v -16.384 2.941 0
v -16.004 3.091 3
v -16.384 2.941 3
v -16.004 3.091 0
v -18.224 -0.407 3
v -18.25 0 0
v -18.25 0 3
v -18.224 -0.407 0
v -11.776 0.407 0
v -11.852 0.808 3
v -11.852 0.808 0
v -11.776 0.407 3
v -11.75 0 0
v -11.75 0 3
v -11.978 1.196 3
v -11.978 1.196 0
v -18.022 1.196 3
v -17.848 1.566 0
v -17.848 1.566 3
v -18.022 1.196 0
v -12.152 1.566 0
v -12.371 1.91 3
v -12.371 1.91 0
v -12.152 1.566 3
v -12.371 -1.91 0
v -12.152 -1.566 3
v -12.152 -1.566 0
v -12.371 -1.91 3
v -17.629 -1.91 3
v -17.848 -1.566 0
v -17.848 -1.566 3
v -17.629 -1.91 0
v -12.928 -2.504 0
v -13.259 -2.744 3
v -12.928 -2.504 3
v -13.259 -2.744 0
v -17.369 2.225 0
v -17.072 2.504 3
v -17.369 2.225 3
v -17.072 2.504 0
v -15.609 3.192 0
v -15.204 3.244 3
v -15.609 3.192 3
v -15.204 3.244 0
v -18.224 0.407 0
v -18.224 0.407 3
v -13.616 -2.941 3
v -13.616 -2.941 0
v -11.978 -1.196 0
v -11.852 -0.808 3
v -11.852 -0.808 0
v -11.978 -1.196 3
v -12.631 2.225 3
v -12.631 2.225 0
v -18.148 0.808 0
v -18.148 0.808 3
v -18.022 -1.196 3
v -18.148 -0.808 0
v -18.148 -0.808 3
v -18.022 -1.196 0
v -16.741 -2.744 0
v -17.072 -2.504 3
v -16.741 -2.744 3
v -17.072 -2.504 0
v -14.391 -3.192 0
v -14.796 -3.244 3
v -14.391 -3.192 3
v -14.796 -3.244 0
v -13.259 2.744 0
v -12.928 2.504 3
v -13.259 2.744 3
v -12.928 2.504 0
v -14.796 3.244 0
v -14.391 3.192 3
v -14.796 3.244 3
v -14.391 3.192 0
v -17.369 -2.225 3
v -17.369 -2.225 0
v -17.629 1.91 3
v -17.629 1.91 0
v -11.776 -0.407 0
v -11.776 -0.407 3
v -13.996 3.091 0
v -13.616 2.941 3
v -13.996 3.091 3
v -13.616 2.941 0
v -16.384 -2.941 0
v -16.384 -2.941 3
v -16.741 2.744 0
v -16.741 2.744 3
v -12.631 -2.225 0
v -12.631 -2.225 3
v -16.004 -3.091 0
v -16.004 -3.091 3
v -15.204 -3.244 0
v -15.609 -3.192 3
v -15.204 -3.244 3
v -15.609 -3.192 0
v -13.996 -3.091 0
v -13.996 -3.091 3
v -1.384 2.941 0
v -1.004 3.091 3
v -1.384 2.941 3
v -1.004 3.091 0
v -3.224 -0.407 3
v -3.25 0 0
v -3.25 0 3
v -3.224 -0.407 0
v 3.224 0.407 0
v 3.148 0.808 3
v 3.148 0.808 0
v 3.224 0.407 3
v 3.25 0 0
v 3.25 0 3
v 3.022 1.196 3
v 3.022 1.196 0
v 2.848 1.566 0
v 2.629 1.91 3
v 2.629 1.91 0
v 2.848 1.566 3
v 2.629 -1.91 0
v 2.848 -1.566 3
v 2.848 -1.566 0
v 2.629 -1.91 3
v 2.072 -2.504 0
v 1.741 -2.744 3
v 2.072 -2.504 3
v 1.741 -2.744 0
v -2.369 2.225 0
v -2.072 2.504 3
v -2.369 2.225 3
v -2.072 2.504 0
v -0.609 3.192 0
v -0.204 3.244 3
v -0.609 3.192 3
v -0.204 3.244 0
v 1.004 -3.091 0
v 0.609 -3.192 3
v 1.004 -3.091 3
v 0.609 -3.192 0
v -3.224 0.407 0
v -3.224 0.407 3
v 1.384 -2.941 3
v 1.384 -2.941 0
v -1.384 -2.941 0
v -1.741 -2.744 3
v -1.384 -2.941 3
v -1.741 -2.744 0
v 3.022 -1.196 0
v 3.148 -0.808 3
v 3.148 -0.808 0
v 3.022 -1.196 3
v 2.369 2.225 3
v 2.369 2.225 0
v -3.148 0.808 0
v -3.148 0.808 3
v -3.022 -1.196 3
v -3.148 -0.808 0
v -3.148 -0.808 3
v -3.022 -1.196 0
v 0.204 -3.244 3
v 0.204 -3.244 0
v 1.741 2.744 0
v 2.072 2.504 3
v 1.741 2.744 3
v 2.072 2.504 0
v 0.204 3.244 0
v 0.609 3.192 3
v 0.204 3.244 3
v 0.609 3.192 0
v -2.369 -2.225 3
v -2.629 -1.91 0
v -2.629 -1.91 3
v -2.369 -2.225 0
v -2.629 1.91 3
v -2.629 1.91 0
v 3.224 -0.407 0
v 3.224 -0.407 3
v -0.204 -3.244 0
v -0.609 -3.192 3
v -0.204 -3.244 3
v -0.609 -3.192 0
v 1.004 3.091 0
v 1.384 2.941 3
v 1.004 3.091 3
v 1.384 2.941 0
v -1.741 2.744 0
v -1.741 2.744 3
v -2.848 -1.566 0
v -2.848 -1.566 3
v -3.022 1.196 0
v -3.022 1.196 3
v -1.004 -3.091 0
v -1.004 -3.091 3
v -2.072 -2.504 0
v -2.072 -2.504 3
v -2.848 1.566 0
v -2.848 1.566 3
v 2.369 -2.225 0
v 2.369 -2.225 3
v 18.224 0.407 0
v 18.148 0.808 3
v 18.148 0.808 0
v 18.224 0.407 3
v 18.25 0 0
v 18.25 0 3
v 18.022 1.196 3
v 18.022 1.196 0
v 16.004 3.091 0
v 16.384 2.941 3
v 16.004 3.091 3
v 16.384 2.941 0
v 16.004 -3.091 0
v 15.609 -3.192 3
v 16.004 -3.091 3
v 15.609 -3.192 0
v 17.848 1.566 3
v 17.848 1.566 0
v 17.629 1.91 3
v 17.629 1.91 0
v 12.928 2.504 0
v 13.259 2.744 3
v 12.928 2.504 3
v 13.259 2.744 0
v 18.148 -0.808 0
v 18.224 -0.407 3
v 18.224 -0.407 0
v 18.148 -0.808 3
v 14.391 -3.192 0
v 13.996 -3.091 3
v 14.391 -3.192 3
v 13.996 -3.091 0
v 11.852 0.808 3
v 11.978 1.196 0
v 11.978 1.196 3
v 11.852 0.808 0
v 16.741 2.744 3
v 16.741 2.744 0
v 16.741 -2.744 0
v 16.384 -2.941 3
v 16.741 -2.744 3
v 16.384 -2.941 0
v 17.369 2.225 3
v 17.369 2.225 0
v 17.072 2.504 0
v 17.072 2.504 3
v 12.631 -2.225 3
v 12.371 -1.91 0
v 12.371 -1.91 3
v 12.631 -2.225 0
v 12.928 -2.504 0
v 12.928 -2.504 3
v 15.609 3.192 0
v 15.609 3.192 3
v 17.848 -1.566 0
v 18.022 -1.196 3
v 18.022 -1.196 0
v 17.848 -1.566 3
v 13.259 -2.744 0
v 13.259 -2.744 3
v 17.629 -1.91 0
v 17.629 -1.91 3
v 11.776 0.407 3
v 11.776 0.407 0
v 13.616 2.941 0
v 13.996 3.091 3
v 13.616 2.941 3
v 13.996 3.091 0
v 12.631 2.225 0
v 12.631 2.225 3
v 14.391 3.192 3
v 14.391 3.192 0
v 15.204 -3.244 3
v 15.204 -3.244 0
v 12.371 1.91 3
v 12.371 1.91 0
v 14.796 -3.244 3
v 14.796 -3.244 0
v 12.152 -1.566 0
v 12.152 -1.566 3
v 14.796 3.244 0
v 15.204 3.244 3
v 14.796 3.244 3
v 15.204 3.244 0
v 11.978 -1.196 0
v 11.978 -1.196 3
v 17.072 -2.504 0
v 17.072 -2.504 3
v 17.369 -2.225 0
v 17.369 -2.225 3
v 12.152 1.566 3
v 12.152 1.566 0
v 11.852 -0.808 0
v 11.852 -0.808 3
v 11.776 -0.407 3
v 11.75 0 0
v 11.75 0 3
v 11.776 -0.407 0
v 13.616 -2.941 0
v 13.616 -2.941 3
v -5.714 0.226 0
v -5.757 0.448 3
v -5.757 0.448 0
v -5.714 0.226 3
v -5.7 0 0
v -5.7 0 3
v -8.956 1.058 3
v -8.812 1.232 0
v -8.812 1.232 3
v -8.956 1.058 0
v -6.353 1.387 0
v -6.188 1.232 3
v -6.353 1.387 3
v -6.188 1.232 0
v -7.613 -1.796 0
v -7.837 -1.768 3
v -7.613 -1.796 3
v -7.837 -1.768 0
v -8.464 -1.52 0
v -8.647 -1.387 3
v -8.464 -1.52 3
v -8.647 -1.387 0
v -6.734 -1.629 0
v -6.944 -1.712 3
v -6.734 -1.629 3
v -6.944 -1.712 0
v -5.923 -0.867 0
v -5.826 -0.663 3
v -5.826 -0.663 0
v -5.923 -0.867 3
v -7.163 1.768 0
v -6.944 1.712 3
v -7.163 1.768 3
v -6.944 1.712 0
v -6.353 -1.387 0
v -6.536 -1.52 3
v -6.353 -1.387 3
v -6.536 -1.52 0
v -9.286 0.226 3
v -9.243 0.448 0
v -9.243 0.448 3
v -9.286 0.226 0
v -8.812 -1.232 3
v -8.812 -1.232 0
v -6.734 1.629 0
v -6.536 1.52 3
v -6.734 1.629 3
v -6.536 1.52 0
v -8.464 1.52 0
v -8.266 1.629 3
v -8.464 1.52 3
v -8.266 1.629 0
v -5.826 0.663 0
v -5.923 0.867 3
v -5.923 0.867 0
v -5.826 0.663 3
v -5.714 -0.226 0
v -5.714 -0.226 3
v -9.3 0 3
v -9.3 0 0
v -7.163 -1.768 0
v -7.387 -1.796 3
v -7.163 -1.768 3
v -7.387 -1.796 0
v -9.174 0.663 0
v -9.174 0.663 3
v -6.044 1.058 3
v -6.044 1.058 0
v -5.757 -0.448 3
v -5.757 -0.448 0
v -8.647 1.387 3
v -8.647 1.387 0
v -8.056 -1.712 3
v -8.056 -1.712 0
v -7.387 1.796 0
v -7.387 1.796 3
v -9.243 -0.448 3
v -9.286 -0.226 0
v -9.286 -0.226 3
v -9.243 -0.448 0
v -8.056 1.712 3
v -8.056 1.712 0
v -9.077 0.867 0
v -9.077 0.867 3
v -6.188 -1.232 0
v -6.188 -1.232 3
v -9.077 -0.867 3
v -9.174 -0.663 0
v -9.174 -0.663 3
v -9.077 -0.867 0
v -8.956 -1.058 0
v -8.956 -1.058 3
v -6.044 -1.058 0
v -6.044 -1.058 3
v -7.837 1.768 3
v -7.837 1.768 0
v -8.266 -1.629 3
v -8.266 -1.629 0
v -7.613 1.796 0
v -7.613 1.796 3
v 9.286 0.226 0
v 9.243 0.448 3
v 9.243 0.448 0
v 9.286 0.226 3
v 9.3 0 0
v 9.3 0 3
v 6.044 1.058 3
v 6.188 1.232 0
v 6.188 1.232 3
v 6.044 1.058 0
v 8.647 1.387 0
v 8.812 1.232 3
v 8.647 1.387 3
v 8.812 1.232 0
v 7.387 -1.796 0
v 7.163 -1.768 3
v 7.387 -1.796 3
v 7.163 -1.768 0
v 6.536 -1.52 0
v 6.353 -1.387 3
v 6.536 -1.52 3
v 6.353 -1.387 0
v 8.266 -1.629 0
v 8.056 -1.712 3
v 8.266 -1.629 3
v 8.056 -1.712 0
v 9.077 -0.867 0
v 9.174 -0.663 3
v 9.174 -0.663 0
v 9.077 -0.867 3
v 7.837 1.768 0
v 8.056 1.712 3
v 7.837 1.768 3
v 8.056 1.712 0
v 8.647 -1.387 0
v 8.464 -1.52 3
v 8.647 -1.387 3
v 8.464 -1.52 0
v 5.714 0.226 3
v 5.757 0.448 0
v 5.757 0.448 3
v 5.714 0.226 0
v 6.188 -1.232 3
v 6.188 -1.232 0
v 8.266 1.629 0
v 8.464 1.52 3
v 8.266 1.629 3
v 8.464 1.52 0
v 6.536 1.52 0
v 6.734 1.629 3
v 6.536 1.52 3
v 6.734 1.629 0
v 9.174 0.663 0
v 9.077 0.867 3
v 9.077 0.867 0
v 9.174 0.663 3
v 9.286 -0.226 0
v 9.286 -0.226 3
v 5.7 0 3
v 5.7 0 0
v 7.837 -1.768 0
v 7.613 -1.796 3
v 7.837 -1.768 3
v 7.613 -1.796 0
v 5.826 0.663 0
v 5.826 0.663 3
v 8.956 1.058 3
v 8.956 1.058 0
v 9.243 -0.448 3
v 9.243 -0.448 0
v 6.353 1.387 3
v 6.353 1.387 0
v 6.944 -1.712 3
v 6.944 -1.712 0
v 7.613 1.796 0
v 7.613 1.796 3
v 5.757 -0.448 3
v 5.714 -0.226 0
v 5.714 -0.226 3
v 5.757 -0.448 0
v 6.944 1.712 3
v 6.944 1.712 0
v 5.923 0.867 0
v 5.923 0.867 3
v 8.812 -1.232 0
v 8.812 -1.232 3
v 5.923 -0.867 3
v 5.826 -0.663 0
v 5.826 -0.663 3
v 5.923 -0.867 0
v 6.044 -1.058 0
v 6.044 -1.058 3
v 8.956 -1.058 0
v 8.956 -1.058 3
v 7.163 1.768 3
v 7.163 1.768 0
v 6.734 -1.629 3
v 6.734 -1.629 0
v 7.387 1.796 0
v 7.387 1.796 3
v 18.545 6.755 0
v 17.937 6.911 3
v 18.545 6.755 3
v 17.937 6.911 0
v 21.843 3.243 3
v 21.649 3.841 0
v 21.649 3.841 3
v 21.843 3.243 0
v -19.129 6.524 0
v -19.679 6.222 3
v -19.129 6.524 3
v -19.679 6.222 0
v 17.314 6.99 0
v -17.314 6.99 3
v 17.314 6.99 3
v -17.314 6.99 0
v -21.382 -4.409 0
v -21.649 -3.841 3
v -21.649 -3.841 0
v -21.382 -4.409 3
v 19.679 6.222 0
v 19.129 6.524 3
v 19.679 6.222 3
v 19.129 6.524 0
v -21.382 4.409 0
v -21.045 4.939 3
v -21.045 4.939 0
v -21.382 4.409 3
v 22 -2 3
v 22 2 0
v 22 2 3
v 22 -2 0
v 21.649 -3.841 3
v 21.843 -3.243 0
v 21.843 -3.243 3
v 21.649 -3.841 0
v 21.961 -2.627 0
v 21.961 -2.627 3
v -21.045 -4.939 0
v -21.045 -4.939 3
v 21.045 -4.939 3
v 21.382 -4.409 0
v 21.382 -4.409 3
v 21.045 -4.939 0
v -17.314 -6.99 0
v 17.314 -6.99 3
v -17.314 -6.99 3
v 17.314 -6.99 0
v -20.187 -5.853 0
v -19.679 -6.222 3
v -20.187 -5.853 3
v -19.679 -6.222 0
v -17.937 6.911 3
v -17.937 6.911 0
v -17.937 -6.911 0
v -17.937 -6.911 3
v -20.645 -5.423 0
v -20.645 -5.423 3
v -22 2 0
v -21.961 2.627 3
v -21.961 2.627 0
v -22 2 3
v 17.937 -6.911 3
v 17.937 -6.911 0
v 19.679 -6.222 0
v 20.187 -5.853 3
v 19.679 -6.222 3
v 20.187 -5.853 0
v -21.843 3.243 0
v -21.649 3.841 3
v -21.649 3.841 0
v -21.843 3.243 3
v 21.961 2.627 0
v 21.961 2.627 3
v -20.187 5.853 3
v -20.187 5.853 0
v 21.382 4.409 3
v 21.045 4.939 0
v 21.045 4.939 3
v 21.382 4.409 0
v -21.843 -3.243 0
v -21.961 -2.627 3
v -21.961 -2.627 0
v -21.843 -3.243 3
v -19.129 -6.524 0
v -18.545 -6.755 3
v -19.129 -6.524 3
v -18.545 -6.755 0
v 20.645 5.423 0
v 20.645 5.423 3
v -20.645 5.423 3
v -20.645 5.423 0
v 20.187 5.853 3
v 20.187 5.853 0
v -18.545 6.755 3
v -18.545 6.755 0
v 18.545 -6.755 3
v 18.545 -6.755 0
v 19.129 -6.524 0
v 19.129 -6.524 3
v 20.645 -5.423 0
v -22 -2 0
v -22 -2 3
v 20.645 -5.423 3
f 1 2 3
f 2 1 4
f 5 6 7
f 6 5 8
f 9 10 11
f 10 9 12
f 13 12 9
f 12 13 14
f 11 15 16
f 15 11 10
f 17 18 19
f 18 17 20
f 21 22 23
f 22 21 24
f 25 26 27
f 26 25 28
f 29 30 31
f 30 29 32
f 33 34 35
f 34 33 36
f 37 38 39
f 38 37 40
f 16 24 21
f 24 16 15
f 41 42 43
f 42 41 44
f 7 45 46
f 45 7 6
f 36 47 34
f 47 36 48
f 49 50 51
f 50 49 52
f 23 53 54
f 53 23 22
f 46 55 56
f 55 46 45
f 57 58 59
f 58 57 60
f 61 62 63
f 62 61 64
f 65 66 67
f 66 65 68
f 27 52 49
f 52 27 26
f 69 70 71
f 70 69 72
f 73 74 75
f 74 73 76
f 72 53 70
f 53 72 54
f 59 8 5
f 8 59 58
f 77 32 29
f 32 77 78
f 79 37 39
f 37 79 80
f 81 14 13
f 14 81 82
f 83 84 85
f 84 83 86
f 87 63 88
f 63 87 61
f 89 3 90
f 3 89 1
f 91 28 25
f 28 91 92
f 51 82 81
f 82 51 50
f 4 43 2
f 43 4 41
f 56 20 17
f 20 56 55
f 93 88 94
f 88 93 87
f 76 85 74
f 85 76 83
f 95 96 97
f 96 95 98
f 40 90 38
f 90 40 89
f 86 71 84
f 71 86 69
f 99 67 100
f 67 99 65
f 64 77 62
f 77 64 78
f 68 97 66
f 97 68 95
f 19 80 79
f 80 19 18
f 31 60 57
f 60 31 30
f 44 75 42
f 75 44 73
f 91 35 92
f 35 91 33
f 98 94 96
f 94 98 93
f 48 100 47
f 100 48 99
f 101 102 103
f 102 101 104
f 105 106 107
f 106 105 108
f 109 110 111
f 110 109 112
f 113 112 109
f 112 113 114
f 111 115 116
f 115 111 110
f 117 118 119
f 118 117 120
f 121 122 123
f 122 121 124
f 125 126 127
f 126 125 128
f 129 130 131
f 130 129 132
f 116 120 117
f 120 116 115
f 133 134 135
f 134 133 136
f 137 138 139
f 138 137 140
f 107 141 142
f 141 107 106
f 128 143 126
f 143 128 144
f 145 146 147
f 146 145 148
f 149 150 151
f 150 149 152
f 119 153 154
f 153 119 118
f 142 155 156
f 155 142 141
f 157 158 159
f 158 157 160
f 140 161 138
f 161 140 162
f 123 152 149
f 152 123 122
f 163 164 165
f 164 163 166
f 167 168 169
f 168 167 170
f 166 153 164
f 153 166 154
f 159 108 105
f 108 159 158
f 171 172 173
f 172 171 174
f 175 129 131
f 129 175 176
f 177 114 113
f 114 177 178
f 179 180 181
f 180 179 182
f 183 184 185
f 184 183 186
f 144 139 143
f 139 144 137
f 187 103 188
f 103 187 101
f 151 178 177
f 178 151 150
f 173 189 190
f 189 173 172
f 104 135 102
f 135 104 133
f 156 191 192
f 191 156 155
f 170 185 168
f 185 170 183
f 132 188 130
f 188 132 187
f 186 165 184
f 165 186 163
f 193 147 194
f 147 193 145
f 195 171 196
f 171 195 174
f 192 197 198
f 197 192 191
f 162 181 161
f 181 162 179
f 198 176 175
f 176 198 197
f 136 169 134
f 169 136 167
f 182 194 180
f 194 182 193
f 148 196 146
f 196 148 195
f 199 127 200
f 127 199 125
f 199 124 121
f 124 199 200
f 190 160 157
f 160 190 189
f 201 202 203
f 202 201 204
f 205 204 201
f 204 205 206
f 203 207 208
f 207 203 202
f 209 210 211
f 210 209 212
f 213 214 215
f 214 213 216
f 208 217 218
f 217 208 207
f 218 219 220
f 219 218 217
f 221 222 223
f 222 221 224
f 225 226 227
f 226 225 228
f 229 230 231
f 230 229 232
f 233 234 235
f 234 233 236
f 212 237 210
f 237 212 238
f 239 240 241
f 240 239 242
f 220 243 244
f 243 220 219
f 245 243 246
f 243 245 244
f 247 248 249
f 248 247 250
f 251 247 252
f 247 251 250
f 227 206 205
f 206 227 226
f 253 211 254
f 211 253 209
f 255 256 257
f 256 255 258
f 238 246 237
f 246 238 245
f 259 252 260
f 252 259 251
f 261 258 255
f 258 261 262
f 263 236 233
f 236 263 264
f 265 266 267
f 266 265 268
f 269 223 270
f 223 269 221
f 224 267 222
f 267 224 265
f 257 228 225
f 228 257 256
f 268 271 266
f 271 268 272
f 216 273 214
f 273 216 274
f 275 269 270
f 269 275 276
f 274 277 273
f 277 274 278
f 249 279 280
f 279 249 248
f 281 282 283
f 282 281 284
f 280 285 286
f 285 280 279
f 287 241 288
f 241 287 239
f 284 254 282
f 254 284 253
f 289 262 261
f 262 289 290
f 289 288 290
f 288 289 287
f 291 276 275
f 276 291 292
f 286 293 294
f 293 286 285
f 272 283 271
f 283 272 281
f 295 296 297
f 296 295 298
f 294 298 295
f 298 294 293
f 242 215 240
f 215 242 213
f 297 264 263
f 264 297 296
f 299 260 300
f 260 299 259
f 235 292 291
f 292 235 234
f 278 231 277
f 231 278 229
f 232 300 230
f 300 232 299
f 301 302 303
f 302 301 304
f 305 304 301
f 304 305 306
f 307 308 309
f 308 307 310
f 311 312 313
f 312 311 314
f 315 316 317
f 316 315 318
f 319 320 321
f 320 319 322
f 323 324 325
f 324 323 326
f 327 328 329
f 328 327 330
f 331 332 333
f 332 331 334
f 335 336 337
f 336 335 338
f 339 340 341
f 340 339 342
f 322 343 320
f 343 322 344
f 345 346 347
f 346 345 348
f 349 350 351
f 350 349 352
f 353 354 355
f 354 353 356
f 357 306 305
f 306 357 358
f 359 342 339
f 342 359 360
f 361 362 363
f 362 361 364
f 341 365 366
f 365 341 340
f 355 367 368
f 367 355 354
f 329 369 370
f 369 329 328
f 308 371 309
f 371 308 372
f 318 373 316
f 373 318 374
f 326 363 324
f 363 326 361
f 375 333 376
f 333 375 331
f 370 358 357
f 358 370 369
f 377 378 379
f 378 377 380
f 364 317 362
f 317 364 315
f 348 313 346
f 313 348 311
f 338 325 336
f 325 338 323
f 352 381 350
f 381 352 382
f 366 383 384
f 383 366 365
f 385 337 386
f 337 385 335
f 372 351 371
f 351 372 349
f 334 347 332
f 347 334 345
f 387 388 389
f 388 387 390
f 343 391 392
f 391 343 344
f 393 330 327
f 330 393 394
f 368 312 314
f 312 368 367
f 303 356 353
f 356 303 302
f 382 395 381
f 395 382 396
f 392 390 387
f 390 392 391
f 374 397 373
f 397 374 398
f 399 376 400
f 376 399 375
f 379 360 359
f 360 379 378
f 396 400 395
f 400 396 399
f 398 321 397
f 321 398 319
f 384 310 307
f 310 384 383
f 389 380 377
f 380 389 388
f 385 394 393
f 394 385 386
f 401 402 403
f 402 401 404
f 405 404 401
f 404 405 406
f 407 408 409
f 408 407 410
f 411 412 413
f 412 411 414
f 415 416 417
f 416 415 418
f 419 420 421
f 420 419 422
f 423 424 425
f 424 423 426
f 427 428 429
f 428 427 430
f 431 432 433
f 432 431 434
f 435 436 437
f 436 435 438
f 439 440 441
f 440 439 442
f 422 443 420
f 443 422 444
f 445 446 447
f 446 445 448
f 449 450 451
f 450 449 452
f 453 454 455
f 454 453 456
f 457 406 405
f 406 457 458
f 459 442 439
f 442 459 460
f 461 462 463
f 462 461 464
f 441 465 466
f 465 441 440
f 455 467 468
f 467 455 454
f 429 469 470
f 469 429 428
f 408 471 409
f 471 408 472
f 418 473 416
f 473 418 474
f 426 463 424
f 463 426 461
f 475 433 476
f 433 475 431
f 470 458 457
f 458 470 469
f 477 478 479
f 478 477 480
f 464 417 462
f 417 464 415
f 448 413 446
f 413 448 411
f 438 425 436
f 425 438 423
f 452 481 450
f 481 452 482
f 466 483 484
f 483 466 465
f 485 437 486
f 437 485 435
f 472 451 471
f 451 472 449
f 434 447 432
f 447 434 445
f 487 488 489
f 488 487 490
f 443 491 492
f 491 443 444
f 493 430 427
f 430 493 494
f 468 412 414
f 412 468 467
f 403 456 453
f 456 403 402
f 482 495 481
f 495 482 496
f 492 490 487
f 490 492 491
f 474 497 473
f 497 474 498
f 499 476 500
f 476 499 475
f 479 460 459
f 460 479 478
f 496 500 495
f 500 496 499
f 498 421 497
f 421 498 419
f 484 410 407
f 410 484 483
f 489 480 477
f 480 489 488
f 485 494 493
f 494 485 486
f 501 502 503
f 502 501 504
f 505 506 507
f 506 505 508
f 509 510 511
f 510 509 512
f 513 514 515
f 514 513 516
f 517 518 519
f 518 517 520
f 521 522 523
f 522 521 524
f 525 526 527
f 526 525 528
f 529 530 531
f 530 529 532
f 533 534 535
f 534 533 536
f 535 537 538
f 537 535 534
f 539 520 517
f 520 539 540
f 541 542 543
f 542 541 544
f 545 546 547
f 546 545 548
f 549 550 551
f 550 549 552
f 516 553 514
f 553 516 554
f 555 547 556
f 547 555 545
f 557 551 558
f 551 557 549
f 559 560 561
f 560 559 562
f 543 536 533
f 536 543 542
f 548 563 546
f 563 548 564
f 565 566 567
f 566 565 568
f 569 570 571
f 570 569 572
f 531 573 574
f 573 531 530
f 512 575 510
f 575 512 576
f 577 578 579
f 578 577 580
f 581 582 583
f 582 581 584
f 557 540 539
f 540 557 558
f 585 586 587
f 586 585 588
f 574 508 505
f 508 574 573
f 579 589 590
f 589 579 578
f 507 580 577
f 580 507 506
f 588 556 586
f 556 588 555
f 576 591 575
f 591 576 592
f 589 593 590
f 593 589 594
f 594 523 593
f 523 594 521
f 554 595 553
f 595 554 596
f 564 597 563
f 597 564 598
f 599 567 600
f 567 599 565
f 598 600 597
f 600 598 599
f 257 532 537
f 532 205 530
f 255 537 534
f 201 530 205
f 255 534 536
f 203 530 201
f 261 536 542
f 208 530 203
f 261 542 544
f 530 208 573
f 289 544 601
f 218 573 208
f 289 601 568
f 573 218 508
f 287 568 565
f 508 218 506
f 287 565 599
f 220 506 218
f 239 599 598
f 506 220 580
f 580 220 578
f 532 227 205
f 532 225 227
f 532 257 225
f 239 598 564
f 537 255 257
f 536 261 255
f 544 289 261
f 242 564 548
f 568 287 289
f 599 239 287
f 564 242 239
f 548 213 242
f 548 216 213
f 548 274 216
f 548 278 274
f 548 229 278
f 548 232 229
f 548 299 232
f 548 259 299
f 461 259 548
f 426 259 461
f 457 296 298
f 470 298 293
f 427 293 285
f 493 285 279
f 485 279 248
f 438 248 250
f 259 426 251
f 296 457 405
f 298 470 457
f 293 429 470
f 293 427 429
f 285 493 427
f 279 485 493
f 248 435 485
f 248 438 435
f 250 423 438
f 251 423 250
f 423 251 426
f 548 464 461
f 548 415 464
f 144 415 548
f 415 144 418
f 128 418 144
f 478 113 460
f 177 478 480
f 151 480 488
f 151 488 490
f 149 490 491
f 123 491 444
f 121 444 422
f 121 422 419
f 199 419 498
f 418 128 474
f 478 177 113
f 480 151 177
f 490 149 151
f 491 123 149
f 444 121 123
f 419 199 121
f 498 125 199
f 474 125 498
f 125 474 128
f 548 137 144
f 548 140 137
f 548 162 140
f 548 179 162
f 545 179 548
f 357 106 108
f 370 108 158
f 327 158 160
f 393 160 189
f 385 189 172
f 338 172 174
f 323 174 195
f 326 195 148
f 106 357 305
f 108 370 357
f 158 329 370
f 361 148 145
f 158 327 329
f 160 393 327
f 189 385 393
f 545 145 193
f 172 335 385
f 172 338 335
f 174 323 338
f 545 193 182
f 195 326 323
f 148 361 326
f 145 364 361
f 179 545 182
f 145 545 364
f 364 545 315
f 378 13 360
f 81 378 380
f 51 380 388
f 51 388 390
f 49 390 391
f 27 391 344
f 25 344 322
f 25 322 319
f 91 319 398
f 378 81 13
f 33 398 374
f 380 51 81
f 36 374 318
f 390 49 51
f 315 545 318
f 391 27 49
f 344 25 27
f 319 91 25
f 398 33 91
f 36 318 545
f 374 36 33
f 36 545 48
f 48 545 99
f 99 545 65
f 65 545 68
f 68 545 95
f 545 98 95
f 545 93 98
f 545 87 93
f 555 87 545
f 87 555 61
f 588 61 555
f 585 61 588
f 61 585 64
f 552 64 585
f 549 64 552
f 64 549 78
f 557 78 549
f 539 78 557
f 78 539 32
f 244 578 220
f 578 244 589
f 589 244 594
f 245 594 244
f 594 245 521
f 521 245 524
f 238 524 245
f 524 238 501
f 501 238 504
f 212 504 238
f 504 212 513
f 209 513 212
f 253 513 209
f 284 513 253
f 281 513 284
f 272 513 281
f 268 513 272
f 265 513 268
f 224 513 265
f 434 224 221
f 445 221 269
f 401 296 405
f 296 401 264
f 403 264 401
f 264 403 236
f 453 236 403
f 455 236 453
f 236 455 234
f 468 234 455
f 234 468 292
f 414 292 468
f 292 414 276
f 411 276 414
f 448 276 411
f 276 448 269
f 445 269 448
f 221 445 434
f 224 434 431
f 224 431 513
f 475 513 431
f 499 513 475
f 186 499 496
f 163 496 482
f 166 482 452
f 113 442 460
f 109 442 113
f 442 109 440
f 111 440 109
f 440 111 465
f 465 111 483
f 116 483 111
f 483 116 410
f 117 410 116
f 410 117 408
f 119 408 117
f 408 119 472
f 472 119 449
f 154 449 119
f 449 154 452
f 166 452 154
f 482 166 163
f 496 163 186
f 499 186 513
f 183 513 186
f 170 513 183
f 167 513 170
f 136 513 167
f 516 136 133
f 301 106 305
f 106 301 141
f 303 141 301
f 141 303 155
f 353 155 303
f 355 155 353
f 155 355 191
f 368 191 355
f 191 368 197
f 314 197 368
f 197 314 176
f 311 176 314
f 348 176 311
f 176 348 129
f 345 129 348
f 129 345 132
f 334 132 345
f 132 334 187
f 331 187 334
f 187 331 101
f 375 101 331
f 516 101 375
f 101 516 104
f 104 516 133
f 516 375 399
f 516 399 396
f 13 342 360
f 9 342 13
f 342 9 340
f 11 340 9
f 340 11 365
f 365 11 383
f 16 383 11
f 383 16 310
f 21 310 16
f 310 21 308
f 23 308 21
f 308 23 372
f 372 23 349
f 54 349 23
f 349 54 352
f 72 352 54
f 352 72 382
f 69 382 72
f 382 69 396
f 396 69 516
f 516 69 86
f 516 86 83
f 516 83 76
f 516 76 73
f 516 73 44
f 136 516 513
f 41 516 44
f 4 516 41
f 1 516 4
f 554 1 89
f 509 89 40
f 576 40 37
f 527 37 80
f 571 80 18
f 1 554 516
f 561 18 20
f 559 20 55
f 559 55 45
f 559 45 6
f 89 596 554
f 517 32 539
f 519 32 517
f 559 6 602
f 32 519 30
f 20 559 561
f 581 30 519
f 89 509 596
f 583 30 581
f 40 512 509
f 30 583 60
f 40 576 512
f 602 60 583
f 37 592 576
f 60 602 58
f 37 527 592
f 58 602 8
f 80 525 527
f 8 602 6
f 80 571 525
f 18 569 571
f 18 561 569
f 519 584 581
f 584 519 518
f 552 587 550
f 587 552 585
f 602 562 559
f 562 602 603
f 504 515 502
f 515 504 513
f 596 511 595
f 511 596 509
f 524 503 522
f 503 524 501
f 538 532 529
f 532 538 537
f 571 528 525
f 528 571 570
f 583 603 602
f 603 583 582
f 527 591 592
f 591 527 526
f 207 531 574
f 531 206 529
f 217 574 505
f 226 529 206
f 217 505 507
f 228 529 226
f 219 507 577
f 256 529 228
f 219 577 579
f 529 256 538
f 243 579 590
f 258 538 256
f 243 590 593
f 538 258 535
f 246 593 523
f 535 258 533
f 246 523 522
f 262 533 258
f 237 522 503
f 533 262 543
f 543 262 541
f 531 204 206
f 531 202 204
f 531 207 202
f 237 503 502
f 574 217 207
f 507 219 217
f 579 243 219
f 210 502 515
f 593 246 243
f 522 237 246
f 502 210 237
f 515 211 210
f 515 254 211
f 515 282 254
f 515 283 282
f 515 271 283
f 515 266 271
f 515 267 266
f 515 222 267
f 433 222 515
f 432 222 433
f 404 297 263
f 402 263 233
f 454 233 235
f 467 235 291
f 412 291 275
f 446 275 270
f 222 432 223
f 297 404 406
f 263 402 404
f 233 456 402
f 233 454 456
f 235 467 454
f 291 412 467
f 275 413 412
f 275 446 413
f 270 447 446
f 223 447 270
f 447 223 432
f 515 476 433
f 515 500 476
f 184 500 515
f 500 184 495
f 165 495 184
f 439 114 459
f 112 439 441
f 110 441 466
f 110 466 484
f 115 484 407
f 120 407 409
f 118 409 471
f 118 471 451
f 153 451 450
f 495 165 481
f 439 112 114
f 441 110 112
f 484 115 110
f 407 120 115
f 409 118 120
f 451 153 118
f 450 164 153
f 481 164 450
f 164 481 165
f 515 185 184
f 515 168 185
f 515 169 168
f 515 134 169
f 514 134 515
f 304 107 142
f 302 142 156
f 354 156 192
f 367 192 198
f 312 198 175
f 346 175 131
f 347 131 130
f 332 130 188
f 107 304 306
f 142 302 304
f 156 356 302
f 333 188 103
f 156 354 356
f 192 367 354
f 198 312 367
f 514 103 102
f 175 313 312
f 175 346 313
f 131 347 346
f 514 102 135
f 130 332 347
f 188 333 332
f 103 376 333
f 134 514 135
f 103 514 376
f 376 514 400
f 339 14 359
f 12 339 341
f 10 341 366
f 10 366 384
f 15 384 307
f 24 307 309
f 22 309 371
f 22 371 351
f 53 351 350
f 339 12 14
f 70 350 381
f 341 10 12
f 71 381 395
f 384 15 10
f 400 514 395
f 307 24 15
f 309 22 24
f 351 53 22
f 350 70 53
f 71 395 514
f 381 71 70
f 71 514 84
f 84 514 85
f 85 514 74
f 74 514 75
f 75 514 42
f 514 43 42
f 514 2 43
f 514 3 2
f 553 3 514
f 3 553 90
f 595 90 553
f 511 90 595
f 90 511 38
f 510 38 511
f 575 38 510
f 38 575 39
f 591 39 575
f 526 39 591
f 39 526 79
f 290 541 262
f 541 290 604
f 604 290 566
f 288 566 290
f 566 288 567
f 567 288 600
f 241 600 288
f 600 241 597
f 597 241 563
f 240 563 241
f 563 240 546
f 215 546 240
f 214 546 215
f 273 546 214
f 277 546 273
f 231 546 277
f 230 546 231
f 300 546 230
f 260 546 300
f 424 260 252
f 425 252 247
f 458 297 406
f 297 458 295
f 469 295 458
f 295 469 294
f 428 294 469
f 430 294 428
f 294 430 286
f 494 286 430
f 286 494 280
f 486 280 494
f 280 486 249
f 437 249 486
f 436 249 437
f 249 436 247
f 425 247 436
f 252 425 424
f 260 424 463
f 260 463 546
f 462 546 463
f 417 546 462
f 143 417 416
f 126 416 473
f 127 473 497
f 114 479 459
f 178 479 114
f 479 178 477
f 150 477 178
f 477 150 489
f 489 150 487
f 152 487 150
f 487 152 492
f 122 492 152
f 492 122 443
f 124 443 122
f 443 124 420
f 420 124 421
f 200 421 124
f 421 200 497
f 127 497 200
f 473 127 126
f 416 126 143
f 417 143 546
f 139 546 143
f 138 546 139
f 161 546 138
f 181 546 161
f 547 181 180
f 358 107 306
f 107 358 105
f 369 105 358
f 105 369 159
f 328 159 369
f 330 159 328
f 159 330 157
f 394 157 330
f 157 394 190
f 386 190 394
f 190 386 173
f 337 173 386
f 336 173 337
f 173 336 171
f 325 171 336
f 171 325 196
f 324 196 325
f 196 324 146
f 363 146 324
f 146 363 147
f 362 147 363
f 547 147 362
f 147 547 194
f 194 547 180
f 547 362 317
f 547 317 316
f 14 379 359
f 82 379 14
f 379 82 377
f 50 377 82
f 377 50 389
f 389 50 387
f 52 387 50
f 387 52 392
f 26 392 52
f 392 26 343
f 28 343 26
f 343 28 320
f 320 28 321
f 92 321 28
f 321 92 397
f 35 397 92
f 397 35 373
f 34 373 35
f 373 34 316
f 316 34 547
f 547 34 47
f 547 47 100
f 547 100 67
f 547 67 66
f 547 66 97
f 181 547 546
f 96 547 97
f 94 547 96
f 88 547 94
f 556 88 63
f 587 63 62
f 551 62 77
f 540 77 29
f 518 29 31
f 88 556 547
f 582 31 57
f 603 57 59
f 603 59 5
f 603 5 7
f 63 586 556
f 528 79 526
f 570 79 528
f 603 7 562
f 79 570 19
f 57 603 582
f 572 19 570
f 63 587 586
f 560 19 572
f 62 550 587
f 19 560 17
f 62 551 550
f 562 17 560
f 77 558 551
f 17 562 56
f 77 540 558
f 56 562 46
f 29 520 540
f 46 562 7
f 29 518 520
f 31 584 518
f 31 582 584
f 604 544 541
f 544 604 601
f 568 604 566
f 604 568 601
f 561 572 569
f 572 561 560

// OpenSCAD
$fn = 50;


difference() {
	union() {
		*color(alpha = 1.0000000000, c = "gray") {
			translate(v = [0, 7, 0]) {
				linear_extrude(height = 1) {
					text(font = "Arial:style=Bold", halign = "center", size = 4.5000000000, text = "COMMENT plate main", valign = "center");
				}
			}
		}
		hull() {
			translate(v = [-17.0000000000, 2.0000000000, 0]) {
				cylinder(h = 3, r = 5);
			}
			translate(v = [17.0000000000, 2.0000000000, 0]) {
				cylinder(h = 3, r = 5);
			}
			translate(v = [-17.0000000000, -2.0000000000, 0]) {
				cylinder(h = 3, r = 5);
			}
			translate(v = [17.0000000000, -2.0000000000, 0]) {
				cylinder(h = 3, r = 5);
			}
		}
	}
	union() {
		*color(alpha = 1.0000000000, c = "gray") {
			translate(v = [0, 7, 0]) {
				linear_extrude(height = 1) {
					text(font = "Arial:style=Bold", halign = "center", size = 4.5000000000, text = "COMMENT holes main", valign = "center");
				}
			}
		}
		translate(v = [-15.0000000000, 0.0000000000, 0]) {
			translate(v = [0, 0, -100]) {
				cylinder(h = 200, r = 3.2500000000);
			}
		}
		translate(v = [0, 0, -100]) {
			cylinder(h = 200, r = 3.2500000000);
		}
		translate(v = [15.0000000000, 0.0000000000, 0]) {
			translate(v = [0, 0, -100]) {
				cylinder(h = 200, r = 3.2500000000);
			}
		}
		translate(v = [-15.0000000000, 0.0000000000, 0]) {
			translate(v = [0, 0, -100]) {
				cylinder(h = 200, r = 1.8000000000);
			}
		}
		translate(v = [-7.5000000000, 0.0000000000, 0]) {
			translate(v = [0, 0, -100]) {
				cylinder(h = 200, r = 1.8000000000);
			}
		}
		translate(v = [0, 0, -100]) {
			cylinder(h = 200, r = 1.8000000000);
		}
		translate(v = [7.5000000000, 0.0000000000, 0]) {
			translate(v = [0, 0, -100]) {
				cylinder(h = 200, r = 1.8000000000);
			}
		}
		translate(v = [15.0000000000, 0.0000000000, 0]) {
			translate(v = [0, 0, -100]) {
				cylinder(h = 200, r = 1.8000000000);
			}
		}
	}
}
